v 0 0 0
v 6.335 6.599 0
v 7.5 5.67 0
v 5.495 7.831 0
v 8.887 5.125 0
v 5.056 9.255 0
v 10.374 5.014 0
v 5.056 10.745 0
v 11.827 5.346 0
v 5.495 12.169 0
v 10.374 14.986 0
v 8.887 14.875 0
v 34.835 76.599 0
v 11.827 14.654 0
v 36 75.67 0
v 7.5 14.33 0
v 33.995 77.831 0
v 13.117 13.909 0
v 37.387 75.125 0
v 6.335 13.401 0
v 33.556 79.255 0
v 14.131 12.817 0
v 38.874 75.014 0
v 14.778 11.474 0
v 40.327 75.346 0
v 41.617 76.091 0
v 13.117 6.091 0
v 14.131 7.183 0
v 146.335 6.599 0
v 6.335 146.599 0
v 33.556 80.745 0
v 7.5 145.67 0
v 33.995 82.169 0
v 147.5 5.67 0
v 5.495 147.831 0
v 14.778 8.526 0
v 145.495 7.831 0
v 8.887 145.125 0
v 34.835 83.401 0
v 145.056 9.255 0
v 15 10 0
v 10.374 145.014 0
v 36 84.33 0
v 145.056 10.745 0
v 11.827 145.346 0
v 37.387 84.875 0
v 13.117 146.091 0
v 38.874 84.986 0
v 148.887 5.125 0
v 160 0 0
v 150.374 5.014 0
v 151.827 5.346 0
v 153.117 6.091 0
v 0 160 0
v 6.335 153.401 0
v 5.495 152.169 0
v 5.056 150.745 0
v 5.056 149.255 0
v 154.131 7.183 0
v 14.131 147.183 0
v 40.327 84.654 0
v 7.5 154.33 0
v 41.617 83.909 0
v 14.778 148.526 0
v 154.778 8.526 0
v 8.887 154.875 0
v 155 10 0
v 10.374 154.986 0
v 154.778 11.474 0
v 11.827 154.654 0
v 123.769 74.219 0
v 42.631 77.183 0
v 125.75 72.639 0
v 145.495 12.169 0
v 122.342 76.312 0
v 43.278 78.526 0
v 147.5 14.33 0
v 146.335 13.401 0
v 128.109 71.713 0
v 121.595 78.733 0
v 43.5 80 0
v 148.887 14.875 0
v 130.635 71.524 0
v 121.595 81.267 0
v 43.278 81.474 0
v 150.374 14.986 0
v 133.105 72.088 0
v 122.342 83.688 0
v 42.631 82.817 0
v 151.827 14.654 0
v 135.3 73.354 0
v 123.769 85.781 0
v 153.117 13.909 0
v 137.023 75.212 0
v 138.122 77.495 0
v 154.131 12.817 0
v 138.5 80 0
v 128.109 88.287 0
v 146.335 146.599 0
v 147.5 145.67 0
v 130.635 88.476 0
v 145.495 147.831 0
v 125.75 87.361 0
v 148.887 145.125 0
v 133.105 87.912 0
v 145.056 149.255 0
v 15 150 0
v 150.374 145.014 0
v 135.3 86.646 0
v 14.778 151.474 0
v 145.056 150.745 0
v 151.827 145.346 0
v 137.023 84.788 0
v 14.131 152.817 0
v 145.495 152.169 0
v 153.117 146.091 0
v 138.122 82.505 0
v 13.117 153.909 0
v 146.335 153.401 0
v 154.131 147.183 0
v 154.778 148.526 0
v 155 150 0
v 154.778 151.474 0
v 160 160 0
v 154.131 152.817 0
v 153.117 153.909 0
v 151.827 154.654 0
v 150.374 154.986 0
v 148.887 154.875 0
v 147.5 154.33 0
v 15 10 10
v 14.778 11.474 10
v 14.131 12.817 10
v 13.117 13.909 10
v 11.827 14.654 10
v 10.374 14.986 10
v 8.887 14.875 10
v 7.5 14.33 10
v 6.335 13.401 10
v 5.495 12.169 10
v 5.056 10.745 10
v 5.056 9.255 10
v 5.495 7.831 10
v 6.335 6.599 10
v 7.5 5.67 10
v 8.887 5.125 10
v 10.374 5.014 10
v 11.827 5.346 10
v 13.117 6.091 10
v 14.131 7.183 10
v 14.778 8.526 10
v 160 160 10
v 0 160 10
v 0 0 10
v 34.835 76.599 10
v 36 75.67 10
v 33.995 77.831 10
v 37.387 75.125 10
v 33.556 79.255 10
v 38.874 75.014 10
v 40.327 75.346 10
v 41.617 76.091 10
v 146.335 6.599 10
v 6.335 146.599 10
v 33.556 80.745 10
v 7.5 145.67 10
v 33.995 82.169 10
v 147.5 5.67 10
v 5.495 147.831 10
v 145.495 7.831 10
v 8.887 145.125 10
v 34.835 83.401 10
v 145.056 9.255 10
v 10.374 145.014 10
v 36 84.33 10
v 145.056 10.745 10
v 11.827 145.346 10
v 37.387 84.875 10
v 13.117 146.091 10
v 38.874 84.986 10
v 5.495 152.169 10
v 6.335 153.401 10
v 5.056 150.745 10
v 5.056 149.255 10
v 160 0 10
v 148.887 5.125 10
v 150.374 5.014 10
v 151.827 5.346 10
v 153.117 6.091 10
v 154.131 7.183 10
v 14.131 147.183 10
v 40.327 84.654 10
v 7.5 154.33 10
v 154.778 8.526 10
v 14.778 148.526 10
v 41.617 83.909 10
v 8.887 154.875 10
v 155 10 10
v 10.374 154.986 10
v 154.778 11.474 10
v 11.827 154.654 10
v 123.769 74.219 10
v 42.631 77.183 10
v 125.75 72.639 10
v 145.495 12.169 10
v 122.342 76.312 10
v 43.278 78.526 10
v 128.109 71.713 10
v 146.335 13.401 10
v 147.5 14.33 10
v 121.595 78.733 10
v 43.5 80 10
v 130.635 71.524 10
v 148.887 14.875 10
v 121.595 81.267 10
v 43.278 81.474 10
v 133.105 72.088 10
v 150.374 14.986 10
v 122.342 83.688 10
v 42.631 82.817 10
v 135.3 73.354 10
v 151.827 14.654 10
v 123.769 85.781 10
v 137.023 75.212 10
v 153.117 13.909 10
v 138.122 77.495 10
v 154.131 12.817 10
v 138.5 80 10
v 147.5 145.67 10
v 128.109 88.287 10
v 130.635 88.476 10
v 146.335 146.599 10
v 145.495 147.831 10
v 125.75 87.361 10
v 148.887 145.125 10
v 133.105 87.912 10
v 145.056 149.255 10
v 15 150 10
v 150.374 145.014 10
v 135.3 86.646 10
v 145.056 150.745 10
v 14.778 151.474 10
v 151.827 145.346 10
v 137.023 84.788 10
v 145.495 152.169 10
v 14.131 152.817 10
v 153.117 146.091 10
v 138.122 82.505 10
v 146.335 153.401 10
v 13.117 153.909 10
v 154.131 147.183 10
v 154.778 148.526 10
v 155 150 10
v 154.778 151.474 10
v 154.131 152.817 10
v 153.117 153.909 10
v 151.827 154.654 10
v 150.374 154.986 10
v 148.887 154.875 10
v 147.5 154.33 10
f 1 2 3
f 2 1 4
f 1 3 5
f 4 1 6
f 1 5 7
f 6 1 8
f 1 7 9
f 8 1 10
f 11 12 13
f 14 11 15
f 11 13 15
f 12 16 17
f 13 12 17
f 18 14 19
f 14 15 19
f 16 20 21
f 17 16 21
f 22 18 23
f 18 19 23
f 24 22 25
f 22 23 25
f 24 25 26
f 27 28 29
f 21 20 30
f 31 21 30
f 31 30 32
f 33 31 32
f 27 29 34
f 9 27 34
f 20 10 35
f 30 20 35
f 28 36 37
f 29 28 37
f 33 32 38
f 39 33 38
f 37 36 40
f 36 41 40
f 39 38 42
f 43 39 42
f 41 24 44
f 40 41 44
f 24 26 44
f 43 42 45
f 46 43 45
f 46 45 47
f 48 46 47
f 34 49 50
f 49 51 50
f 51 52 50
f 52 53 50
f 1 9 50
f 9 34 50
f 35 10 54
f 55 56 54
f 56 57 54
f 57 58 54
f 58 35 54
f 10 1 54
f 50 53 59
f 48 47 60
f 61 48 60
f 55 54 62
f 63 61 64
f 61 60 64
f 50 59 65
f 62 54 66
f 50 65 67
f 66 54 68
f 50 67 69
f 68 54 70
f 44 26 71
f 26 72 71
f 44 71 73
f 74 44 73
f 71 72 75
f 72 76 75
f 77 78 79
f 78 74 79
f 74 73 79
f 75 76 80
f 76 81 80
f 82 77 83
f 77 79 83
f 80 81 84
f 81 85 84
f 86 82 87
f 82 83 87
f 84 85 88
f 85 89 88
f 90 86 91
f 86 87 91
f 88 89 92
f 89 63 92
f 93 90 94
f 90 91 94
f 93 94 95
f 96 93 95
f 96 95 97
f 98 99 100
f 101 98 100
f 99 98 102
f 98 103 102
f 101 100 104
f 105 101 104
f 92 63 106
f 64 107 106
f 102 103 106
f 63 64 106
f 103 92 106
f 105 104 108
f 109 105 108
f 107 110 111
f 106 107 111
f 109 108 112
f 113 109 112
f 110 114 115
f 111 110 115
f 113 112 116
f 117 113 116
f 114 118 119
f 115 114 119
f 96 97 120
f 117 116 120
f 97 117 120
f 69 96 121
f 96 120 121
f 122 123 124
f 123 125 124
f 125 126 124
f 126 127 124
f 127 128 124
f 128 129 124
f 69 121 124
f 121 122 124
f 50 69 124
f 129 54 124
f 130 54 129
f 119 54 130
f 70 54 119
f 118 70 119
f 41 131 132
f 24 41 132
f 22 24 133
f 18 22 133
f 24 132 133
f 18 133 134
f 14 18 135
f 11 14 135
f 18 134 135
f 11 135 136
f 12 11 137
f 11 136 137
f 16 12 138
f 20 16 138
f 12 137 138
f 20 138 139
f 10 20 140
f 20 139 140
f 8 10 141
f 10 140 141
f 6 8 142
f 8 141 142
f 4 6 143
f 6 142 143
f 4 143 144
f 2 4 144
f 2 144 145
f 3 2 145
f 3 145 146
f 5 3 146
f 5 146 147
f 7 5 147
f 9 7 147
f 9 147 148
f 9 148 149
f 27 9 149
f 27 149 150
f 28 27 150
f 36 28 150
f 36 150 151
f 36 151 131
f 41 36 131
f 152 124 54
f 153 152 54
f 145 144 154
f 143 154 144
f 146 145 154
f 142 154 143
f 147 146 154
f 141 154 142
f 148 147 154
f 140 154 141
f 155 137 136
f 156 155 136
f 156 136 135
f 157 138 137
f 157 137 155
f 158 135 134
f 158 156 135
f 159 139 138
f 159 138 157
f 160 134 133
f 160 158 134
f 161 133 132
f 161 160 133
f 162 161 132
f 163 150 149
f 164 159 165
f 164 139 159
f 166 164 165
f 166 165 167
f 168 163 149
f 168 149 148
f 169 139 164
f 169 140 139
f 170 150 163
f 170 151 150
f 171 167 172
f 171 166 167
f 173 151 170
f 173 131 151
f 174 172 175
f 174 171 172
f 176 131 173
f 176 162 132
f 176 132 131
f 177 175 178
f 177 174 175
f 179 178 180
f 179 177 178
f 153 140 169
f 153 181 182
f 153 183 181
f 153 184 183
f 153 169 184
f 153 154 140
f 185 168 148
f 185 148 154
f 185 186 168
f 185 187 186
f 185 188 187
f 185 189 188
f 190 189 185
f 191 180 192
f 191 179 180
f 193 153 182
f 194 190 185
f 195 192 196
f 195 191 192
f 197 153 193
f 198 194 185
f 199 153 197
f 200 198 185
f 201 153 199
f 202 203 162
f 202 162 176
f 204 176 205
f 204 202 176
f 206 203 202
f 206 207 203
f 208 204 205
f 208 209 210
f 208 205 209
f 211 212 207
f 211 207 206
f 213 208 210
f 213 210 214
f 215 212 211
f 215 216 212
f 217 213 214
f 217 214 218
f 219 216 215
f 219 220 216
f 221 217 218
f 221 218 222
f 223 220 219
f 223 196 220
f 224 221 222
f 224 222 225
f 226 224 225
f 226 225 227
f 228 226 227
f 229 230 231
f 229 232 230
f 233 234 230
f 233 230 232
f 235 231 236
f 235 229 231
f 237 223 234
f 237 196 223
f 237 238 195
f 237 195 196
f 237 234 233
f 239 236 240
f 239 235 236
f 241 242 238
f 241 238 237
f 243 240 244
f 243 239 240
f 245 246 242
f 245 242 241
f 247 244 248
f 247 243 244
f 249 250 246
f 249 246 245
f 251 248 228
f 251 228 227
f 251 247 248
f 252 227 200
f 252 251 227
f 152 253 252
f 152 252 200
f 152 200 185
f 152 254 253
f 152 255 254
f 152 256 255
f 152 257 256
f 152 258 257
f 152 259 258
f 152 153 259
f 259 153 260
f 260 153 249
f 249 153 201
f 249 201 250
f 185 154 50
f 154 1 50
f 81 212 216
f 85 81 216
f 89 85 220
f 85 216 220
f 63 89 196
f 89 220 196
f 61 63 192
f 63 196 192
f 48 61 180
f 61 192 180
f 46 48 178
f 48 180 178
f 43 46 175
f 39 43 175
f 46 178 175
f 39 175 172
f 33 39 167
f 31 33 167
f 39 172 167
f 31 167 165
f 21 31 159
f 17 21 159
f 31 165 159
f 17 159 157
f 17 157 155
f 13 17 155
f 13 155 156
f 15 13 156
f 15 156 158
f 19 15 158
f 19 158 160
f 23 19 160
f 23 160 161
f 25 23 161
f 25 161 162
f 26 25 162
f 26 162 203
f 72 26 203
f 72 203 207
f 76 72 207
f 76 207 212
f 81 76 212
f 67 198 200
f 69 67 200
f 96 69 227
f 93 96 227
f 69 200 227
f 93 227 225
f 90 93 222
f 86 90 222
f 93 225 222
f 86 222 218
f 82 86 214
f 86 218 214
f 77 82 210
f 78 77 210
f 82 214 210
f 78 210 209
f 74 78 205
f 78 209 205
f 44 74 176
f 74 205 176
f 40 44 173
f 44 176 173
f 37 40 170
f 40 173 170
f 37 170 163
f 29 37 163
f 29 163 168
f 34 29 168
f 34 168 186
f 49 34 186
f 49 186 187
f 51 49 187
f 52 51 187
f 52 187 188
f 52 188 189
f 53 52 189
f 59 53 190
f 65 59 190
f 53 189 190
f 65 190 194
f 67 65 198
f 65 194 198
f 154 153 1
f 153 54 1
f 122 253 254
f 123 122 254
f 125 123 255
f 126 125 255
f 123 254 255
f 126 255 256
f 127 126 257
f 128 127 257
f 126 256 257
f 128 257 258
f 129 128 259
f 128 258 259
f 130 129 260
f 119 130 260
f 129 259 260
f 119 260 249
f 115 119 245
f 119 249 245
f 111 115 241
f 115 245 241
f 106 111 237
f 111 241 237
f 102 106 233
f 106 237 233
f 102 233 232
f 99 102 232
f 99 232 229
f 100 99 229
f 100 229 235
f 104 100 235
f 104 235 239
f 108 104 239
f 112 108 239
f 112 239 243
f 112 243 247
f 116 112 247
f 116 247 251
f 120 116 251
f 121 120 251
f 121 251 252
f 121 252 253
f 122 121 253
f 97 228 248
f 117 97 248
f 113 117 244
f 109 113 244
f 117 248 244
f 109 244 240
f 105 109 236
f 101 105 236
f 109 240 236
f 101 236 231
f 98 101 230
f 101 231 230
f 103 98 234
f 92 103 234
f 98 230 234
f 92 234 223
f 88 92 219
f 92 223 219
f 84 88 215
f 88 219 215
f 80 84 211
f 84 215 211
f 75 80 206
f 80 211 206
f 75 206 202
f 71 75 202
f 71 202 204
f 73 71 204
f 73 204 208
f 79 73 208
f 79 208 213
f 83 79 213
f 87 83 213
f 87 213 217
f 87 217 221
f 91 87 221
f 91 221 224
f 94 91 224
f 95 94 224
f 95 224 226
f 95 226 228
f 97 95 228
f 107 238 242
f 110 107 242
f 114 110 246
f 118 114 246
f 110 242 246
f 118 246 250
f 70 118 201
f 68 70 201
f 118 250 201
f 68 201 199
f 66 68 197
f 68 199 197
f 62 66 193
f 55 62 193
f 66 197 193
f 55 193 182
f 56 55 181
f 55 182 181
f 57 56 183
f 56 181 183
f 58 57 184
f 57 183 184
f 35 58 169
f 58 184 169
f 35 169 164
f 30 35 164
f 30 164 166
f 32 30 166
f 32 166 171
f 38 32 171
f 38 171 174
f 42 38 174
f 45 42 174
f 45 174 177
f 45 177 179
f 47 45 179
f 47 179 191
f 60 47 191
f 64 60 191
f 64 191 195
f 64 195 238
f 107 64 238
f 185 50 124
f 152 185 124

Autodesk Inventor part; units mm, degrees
ref_plane "YZ Plane" through (0, 0, 0) normal (1, 0, 0) x (0, 1, 0)
ref_plane "XZ Plane" through (0, 0, 0) normal (0, 1, 0) x (-1, 0, 0)
ref_plane "XY Plane" through (0, 0, 0) normal (0, 0, 1) x (1, 0, 0)
sketch "Sketch1" plane through (0, 0, 0) normal (0, 0, 1) x (1, 0, 0)
  line L0 (0, 0) -> (160, 0)
  line L1 (160, 0) -> (160, 160)
  line L2 (160, 160) -> (0, 160)
  line L3 (0, 160) -> (0, 0)
  dimension "d0" = 160
  dimension "d1" = 160
extrude "Extrusion1" add sketch "Sketch1" along normal blind 10
sketch "Sketch2" plane through (0, 0, 10) normal (0, 0, 1) x (1, 0, 0)
  line L0 (0, 160) -> (0, 0) projected
  line L1 (0, 0) -> (10, 0)
  line L2 (0, 0) -> (160, 0) projected
  line L3 (10, 0) -> (10, 150)
  line L4 (10, 150) -> (150, 150)
  line L5 (150, 150) -> (150, 10)
  line L6 (150, 10) -> (10, 10)
  line L7 (0, 0) -> (0, 10)
  line L8 (0, 0) -> (0, 2)
  line L9 (160, 160) -> (0, 160) projected
  line L10 (0, 160) -> (0, 121.5)
  line L11 (0, 160) -> (0, 80)
  line L12 (0, 80) -> (38.5, 80)
  circle A0 centre (38.5, 80) radius 5
  line L13 (160, 0) -> (160, 80)
  line L14 (160, 80) -> (130, 80)
  circle A1 centre (130, 80) radius 8.5
  dimension "d4" = 10
  dimension "d5" = 150
  dimension "d6" = 140
  dimension "d7" = 140
  dimension "d8" = 38.5
  dimension "d9" = 80
  dimension "d10" = 38.5
  dimension "d11" = 10
  dimension "d12" = 80
  dimension "d13" = 30
  dimension "d14" = 17
sketch "Sketch3" plane through (0, 0, 10) normal (0, 0, 1) x (1, 0, 0)
  circle A0 centre (10, 10) radius 5
  circle A1 centre (10, 150) radius 5
  circle A2 centre (150, 150) radius 5
  circle A3 centre (150, 10) radius 5
  point P0 (0, 0)
  dimension "d15" = 10
  dimension "d16" = 10
  dimension "d17" = 10
  dimension "d18" = 10
extrude "Extrusion2" cut sketch "Sketch3" against normal through all
extrude "Extrusion3" cut sketch "Sketch2" against normal through all contours A1 | A0
properties part number "cappingsystem 3rd part"
